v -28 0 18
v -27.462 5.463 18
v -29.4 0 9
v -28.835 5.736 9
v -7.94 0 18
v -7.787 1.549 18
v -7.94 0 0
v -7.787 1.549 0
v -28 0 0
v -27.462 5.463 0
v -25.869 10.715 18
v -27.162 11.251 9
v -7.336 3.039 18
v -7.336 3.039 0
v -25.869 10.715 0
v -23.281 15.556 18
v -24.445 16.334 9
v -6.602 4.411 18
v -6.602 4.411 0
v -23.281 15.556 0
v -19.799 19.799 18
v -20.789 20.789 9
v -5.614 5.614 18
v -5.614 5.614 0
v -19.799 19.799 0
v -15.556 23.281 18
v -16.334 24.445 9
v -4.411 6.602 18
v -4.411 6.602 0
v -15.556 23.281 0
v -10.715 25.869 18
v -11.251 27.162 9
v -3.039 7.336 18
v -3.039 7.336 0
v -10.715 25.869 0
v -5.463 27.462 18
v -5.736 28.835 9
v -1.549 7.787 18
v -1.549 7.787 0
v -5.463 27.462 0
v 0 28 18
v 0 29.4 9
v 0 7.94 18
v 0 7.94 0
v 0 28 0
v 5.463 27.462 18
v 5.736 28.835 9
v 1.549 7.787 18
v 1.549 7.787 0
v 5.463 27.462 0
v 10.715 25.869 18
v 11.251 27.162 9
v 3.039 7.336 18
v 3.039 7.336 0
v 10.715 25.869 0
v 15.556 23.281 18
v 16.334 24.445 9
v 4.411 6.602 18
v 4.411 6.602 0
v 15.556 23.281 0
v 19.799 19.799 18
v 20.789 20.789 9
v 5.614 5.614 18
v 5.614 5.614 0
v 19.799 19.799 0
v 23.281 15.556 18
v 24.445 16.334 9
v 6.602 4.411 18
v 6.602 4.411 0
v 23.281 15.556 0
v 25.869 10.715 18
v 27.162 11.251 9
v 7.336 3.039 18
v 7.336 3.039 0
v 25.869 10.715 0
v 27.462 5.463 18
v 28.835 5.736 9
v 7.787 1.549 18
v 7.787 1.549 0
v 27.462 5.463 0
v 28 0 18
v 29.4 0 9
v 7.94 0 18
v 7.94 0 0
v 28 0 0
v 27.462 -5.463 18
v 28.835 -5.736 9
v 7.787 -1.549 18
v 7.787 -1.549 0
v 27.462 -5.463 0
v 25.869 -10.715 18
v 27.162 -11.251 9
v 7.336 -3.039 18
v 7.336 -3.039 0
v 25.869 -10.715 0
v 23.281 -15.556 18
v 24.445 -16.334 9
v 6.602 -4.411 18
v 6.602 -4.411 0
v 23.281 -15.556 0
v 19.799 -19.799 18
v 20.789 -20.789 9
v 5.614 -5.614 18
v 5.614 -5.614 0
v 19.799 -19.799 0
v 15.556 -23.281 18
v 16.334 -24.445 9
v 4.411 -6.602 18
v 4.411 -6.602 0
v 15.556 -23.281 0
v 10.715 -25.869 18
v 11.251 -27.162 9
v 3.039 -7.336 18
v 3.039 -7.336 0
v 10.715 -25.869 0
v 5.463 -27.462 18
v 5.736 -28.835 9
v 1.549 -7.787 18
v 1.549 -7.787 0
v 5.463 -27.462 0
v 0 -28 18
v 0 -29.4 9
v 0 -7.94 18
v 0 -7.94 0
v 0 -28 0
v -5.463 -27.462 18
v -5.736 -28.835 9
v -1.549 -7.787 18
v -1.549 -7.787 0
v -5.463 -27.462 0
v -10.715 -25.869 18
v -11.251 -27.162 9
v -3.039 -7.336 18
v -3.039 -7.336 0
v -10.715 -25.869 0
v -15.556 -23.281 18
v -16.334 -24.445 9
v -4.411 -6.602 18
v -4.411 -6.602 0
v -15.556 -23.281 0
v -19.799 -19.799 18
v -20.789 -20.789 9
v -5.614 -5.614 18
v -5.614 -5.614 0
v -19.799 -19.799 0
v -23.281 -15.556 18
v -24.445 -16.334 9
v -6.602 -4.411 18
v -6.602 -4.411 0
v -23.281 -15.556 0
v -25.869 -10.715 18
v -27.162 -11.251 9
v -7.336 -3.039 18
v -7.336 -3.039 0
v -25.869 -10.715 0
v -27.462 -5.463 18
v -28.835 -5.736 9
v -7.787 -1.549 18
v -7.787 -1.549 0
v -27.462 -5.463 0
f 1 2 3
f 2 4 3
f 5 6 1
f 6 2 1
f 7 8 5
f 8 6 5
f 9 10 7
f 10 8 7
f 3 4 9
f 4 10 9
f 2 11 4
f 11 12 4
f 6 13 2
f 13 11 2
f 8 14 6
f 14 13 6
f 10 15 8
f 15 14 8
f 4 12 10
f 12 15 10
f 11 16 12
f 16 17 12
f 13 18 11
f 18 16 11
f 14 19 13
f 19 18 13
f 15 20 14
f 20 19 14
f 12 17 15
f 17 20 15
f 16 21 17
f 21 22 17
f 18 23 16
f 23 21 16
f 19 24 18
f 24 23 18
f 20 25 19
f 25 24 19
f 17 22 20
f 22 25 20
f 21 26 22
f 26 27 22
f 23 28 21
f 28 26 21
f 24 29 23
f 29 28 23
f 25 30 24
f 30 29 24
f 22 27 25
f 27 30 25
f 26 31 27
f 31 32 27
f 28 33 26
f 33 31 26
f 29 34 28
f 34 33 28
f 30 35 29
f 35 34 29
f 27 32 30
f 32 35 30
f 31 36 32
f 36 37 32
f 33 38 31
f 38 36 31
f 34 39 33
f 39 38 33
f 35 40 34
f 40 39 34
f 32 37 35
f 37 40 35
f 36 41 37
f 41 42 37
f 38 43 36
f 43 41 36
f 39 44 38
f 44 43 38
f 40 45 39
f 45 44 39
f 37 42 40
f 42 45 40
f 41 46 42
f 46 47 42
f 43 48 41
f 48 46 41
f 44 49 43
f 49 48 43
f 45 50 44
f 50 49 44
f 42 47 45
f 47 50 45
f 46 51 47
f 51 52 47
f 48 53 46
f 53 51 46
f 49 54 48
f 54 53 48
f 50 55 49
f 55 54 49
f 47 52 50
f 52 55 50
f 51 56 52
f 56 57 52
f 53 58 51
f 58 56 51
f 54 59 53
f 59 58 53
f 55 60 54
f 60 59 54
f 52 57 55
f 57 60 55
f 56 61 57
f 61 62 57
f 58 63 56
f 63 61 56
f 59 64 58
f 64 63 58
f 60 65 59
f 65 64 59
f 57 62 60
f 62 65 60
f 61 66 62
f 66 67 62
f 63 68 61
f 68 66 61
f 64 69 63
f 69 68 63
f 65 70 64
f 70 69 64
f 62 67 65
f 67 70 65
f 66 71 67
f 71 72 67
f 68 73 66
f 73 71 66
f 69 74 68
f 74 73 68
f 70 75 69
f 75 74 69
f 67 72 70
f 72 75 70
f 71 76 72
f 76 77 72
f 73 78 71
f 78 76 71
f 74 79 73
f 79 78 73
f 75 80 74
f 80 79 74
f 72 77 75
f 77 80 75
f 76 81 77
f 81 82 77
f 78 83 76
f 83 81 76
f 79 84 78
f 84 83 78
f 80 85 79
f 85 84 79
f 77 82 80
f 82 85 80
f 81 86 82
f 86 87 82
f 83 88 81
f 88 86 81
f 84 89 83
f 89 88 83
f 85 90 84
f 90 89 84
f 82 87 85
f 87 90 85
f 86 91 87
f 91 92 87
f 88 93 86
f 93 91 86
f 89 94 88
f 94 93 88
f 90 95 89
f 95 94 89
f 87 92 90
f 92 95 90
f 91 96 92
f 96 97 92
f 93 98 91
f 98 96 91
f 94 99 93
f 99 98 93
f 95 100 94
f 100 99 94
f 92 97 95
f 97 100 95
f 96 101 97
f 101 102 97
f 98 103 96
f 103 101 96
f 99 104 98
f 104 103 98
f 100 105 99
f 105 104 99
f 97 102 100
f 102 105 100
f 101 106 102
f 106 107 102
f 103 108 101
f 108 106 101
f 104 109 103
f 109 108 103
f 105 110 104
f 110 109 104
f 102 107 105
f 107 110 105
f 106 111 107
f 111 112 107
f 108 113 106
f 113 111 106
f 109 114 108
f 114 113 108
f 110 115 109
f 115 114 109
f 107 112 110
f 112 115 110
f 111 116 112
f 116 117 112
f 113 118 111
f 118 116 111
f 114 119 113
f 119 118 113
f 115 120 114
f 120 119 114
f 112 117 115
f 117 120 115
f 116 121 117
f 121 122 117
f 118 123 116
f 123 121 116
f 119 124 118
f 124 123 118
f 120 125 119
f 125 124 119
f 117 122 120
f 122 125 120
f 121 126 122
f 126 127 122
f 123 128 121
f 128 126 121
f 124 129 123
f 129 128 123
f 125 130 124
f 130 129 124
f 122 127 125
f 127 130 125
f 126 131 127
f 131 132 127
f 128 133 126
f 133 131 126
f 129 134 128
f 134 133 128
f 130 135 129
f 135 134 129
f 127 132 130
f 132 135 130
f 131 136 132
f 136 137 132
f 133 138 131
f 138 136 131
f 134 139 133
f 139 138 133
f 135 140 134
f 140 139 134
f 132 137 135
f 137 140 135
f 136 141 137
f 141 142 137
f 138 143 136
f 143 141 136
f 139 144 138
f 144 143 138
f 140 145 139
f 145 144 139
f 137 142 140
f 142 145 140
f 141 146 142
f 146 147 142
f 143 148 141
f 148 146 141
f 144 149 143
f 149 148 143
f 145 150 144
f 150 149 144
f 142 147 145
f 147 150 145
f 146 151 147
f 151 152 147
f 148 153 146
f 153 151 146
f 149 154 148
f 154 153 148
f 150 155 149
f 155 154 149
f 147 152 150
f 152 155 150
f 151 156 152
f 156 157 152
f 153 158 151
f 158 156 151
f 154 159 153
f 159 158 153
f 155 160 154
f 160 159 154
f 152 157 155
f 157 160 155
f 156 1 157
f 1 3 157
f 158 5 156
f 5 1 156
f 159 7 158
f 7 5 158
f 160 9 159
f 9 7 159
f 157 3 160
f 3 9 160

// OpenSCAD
$fn = 32;

// ----------------------------------------------------------------------
// Belt roller: 56 mm barrel, 18 mm wide, bore 15.88 mm
// ----------------------------------------------------------------------

// --- parameters (mm) ---
bore_d = 15.88;           // bore
barrel_d = 56;            // barrel diameter
roller_w = 18;            // roller width
crown = 1.4;              // crown height at mid width

roller_profile = [[7.94, 0], [28, 0], [29.4, 9], [28, 18], [7.94, 18]];

/* the profile stays clear of the axis, so the bore comes out of the revolve */
rotate_extrude() polygon(roller_profile);
